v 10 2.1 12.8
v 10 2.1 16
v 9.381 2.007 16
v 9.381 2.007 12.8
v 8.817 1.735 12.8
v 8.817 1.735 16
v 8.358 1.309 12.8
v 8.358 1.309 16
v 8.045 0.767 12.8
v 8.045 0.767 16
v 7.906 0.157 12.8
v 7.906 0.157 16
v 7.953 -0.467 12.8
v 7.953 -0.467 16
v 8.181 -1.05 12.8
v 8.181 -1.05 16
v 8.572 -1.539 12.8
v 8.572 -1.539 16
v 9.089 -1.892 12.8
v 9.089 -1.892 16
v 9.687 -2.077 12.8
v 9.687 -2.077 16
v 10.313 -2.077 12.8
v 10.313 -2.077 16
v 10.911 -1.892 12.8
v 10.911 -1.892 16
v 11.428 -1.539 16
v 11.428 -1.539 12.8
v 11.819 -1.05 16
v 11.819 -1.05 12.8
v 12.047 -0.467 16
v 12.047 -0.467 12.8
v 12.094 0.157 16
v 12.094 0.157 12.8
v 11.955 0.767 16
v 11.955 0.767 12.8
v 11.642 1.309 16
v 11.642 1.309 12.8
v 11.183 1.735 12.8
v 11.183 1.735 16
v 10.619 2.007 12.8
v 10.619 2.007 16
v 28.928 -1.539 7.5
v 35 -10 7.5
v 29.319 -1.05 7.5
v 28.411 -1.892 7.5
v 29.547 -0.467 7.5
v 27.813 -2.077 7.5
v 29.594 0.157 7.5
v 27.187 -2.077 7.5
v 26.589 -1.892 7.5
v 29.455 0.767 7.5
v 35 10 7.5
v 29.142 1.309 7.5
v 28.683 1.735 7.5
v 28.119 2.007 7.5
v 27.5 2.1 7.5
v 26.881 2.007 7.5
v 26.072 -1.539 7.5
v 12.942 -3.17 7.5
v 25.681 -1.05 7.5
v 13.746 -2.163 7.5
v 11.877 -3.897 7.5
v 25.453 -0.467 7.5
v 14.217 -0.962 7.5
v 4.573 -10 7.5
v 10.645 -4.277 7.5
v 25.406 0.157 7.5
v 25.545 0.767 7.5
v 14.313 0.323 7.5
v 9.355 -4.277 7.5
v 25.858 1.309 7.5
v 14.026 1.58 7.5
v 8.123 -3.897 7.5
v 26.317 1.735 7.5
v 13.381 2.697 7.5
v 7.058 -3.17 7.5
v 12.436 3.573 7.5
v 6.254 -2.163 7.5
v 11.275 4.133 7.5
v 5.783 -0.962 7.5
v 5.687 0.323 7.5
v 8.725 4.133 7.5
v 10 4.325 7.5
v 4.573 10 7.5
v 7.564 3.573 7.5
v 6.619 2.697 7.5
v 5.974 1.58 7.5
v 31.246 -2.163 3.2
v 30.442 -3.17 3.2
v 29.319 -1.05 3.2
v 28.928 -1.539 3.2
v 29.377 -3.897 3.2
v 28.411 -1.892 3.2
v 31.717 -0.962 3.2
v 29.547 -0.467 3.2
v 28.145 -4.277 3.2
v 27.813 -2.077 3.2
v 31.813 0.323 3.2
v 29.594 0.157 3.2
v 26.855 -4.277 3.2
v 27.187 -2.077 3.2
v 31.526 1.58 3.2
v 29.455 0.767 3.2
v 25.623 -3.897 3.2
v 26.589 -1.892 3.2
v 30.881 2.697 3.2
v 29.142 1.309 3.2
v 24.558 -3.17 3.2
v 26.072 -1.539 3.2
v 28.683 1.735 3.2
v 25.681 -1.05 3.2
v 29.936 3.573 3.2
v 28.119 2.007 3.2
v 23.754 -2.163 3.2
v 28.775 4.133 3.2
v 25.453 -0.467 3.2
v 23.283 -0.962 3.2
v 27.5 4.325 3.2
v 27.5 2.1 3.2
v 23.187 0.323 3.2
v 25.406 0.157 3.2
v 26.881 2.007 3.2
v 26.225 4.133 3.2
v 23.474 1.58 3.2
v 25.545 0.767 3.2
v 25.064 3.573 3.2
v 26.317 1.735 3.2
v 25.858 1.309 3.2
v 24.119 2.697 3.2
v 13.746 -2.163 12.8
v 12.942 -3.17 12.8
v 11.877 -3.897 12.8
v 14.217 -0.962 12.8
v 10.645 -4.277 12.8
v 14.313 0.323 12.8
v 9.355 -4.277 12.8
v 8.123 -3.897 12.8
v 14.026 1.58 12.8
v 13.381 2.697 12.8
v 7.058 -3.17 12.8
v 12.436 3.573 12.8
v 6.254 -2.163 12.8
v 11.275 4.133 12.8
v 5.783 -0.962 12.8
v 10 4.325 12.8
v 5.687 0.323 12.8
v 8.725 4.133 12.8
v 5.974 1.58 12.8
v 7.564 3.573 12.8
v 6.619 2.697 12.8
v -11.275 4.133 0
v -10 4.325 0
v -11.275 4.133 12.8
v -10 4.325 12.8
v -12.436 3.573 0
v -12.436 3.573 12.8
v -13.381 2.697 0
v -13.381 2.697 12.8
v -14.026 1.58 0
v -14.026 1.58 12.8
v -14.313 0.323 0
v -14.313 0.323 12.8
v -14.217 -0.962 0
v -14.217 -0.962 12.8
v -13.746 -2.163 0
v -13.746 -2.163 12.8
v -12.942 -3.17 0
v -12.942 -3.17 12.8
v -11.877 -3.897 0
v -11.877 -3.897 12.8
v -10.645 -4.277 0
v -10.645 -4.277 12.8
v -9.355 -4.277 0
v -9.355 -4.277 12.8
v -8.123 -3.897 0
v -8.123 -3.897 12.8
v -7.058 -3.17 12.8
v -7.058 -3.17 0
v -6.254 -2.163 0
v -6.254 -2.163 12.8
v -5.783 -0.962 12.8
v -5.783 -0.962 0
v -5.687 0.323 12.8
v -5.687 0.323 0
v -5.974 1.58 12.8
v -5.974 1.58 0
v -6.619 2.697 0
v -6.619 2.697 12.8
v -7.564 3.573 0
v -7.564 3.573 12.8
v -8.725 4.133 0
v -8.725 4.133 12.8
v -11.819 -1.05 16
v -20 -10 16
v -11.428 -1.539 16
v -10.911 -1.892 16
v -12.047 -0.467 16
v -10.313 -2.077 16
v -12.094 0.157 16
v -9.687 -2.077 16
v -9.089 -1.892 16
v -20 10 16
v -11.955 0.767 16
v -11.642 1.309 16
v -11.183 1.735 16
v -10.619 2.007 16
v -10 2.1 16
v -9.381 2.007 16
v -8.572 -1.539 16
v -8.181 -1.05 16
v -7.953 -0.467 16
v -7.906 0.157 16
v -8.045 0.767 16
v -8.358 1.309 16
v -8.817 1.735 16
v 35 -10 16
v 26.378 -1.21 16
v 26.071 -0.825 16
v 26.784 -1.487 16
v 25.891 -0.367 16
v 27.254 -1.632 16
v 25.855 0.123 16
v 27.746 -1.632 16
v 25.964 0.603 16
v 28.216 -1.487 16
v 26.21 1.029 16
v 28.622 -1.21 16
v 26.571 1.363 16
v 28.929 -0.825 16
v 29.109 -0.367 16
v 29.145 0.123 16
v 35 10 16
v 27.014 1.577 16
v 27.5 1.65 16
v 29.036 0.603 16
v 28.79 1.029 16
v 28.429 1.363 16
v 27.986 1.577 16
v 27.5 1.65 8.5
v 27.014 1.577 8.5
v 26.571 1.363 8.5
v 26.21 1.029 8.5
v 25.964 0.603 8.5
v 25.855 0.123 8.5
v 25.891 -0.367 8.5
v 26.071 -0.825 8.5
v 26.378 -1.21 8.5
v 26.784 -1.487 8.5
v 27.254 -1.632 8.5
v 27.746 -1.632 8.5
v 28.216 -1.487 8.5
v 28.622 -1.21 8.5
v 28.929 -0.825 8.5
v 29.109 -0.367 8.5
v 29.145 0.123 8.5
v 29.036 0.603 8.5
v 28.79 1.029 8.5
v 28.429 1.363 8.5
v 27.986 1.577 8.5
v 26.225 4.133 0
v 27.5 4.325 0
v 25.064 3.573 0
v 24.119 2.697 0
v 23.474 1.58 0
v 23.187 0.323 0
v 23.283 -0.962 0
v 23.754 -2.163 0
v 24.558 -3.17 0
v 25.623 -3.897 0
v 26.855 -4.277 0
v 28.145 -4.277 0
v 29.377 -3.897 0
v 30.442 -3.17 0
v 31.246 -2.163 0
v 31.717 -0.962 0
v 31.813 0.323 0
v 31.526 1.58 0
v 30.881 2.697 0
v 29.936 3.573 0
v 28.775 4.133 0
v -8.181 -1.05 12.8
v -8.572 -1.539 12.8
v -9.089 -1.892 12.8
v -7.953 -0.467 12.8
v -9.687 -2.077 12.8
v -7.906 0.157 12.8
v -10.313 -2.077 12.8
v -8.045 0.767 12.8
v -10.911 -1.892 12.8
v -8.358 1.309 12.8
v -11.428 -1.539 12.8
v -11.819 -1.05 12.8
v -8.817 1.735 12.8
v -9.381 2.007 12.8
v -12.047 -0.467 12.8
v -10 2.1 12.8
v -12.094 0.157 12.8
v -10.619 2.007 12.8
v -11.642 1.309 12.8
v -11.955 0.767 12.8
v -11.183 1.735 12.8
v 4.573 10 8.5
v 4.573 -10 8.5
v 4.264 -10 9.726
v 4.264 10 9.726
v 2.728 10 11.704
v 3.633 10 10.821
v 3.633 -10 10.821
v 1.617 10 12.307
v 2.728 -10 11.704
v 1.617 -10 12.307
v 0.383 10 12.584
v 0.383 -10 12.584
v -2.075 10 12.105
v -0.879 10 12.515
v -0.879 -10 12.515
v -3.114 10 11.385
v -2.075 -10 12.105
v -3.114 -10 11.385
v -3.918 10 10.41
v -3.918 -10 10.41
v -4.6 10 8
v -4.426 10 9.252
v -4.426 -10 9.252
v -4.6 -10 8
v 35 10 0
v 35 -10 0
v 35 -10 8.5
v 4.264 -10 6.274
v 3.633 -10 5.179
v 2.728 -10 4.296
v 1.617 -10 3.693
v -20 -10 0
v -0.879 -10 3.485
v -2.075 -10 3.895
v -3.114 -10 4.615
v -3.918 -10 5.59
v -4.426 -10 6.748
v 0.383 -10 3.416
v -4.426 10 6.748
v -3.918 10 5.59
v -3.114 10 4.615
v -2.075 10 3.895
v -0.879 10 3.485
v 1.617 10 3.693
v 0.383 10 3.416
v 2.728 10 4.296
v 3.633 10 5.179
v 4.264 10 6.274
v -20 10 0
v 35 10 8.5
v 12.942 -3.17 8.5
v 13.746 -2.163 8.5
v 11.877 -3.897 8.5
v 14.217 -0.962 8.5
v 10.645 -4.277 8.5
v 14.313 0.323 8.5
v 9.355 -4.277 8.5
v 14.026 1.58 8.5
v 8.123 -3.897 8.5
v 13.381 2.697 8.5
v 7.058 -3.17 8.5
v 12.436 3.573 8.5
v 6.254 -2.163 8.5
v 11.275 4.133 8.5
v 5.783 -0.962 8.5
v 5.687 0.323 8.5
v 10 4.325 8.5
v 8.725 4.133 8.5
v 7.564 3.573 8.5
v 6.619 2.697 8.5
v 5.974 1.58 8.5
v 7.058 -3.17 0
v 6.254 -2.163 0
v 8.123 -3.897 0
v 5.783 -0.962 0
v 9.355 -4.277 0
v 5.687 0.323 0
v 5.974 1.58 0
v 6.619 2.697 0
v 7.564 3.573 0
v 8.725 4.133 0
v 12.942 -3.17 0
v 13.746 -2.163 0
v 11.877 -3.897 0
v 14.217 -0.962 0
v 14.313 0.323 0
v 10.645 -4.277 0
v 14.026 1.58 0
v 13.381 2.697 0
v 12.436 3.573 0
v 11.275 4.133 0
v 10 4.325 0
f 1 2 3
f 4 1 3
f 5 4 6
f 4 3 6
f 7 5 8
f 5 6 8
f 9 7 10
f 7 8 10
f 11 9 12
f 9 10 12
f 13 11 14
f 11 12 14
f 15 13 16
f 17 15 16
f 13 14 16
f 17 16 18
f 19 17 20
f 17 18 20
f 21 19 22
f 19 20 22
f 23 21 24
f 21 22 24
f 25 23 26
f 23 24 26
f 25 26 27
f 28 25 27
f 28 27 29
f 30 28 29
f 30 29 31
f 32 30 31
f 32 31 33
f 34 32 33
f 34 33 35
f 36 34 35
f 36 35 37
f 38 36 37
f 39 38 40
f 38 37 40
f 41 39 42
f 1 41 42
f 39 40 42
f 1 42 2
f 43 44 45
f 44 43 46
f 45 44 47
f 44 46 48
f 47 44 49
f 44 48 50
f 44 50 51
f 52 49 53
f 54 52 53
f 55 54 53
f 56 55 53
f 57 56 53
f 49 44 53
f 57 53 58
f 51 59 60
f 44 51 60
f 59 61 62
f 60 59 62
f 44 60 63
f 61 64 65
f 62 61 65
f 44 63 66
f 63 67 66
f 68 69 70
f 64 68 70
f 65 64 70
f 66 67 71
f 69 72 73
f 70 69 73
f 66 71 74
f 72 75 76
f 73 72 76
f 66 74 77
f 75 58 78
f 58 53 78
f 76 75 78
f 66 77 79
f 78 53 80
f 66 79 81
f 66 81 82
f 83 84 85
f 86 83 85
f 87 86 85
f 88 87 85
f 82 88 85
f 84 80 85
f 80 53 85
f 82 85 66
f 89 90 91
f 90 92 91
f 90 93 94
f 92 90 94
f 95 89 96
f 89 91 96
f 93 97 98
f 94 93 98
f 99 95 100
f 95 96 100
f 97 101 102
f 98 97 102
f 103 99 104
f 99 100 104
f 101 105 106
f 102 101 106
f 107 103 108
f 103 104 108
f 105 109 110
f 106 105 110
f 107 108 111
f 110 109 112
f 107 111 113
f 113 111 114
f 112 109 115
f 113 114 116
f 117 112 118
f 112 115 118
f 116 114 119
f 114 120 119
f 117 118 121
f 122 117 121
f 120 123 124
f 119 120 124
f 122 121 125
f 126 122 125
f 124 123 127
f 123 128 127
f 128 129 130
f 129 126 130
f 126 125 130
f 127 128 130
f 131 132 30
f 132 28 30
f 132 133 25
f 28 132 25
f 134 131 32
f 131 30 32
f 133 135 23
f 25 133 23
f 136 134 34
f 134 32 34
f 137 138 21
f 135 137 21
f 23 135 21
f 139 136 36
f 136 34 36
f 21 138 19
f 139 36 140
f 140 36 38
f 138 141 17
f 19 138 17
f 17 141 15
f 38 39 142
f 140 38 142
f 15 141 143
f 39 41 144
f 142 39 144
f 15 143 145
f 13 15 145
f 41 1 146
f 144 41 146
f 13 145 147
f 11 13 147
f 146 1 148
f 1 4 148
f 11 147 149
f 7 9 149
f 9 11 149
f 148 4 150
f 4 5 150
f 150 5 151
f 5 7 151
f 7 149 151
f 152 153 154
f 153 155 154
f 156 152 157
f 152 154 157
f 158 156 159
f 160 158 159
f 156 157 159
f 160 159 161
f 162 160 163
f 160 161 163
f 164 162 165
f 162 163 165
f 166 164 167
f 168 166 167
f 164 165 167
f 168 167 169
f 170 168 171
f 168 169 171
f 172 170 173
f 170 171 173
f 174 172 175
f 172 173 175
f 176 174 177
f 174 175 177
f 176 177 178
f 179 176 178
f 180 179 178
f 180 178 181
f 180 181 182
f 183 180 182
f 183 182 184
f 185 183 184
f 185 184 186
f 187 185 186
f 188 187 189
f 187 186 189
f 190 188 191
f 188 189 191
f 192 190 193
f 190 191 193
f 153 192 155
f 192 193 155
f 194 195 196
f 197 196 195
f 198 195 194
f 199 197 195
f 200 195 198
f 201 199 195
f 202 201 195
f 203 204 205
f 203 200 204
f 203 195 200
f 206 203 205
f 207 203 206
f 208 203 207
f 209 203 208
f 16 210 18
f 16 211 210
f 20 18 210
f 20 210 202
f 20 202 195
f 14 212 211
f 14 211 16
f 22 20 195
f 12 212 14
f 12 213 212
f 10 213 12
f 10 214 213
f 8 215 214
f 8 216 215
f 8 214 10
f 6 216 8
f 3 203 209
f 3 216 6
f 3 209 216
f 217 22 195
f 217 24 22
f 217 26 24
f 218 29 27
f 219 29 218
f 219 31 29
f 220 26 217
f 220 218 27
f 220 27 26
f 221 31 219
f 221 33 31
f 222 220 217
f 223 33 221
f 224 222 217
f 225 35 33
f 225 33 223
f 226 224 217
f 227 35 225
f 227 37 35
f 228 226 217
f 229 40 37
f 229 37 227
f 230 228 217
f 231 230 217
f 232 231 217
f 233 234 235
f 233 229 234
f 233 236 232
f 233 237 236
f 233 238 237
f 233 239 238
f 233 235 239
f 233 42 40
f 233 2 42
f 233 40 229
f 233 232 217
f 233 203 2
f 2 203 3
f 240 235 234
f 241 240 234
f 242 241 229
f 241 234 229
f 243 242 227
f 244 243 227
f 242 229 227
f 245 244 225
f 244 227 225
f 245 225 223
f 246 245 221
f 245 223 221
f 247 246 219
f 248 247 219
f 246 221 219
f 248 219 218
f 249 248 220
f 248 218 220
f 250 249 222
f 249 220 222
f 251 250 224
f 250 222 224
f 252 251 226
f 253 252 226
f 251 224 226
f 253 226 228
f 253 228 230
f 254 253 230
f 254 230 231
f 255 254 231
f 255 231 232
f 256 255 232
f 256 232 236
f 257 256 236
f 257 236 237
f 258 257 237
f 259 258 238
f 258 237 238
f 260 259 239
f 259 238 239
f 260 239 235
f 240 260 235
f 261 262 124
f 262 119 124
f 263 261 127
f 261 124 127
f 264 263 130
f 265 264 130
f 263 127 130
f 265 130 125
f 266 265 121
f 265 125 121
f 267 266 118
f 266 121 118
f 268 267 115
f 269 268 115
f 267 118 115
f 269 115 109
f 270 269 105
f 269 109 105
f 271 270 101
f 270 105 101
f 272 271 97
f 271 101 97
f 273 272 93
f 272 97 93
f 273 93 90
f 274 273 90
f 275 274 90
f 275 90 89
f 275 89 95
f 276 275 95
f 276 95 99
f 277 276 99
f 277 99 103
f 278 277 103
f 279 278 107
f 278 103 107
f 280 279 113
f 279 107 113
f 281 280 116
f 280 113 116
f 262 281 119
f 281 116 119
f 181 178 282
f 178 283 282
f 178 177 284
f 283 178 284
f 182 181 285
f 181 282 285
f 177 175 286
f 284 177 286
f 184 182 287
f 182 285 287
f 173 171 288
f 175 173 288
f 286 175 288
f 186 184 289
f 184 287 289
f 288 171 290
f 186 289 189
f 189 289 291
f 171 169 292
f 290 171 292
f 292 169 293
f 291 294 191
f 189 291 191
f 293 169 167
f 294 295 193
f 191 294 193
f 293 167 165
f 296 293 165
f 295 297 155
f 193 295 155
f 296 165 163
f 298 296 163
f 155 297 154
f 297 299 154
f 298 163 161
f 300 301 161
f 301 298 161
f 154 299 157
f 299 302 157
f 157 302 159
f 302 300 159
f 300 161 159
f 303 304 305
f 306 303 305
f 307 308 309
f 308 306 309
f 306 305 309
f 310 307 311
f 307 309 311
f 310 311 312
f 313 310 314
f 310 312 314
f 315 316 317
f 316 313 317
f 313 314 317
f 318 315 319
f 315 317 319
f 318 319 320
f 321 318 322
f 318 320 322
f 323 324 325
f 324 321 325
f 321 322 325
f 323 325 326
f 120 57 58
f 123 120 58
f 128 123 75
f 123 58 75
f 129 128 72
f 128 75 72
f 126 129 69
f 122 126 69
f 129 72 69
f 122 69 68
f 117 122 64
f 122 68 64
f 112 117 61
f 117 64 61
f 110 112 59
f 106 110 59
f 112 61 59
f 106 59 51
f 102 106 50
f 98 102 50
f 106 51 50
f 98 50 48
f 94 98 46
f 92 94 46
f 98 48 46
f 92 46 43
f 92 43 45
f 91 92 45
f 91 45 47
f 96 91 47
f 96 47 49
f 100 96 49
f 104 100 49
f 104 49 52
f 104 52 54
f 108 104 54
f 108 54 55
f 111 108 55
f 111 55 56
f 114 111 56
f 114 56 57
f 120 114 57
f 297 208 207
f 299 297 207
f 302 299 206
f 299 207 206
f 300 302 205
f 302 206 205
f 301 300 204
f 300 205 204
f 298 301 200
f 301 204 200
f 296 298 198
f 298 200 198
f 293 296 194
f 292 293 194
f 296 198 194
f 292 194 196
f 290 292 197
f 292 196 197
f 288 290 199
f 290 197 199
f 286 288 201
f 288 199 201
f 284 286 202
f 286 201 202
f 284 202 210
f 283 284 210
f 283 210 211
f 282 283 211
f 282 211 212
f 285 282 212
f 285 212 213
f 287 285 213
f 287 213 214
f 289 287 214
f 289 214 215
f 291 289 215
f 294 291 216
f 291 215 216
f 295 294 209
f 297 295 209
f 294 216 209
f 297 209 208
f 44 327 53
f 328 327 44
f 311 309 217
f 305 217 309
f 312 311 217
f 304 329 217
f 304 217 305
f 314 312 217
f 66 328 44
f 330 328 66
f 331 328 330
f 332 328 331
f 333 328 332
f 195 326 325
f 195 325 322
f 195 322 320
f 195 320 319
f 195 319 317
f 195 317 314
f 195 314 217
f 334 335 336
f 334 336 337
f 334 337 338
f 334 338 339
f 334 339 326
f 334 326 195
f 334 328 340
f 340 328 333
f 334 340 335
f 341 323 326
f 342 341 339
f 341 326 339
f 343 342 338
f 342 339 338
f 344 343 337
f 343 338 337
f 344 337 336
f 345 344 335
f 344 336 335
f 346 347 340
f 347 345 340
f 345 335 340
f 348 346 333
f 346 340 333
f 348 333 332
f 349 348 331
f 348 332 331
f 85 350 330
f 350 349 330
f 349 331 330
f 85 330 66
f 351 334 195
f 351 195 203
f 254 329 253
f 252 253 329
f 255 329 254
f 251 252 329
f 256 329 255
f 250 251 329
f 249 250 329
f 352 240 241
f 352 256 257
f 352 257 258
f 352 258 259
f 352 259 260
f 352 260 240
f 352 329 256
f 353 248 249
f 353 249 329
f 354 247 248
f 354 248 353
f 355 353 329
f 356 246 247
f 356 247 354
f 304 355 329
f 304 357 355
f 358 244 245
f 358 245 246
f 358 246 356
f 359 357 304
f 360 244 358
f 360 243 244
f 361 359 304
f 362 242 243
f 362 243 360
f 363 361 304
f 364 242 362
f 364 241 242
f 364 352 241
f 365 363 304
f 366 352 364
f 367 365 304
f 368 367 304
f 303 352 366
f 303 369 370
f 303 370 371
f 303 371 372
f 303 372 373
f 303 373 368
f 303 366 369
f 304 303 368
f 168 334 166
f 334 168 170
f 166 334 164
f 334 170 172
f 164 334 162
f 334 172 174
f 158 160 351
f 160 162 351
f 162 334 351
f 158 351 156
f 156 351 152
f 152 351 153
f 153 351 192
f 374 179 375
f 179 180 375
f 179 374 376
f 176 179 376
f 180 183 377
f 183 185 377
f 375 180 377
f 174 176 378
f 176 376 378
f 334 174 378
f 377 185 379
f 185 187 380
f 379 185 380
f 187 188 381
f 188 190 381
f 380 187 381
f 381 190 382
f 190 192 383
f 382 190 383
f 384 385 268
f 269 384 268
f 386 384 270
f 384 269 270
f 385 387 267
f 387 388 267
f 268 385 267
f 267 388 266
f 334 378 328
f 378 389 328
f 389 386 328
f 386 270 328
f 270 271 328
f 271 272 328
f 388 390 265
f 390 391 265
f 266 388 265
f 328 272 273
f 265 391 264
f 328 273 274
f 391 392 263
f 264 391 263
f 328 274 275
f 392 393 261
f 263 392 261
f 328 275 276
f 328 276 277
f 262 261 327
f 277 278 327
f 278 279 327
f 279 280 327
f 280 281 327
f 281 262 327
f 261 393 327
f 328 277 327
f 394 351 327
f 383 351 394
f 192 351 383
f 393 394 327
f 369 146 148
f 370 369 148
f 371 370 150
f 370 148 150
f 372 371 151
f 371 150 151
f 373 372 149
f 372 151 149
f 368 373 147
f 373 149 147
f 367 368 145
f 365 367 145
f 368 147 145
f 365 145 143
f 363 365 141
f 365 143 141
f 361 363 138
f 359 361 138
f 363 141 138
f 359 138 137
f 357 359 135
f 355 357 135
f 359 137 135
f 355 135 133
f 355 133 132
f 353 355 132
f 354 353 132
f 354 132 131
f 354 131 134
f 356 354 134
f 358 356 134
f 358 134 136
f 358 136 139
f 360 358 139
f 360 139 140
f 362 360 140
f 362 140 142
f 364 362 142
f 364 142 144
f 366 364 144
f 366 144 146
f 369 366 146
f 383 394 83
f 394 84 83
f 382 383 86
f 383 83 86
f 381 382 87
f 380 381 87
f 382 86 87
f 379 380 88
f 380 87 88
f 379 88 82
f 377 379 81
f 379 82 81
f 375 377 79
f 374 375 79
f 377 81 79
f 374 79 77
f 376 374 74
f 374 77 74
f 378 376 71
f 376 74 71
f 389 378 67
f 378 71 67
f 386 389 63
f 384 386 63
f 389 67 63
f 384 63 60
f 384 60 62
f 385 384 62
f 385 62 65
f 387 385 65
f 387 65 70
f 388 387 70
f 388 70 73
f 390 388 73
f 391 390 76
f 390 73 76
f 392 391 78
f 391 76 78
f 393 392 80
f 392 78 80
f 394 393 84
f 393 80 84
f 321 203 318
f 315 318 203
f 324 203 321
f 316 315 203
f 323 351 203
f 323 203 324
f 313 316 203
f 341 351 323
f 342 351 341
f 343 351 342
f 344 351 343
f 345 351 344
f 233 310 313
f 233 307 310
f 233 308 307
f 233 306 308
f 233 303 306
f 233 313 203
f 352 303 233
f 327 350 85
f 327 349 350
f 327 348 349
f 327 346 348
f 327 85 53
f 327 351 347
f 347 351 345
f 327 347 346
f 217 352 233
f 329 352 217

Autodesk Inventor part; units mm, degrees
ref_plane "YZ Plane" through (0, 0, 0) normal (1, 0, 0) x (0, 1, 0)
ref_plane "XZ Plane" through (0, 0, 0) normal (0, 1, 0) x (-1, 0, 0)
sketch "Sketch1" plane through (0, 0, 0) normal (0, 0, 1) x (1, 0, 0)
  line L0 (-20, 10) -> (35, 10)
  line L1 (35, 10) -> (35, -10)
  line L2 (35, -10) -> (-20, -10)
  line L3 (-20, -10) -> (-20, 10)
  line L4 (-31, 0) -> (46, 0) projected
  line L5 (0, -14) -> (0, 14) projected
  point P0 (0, 0)
  point P1 (-10, 0)
  point P2 (10, 0)
  point P3 (27.5, 0)
  dimension "d0" = 20
  dimension "d2" = 55
  dimension "d8" = 20
  dimension "d9" = 20
  dimension "d10" = 7.5
extrude "Extrusion1" add sketch "Sketch1" along normal blind 16
sketch "Sketch2" plane through (0, 0, 0) normal (0, 0, 1) x (1, 0, 0)
  line L0 (-20, 10) -> (35, 10)
  line L1 (35, 10) -> (35, -10)
  line L2 (35, -10) -> (-20, -10)
  line L3 (-20, -10) -> (-20, 10)
  line L4 (0, 14) -> (0, -14) projected
  line L5 (-31, 0) -> (46, 0) projected
  point P0 (0, 0)
  point P1 (-10, 0)
  point P2 (10, 0)
  dimension "d38" = 20
  dimension "d39" = 55
  dimension "d41" = 20
hole "Hole4" at (-10, 0, 0) at (10, 0, 0) direction (0, 0, 1) diameter 4.2 end through all counterbore diameter 8.65 counterbore depth 12.8
sketch "Sketch3" plane through (0, 0, 0) normal (0, 0, 1) x (1, 0, 0)
  line L0 (-20, 10) -> (35, 10)
  line L1 (35, 10) -> (35, -10)
  line L2 (35, -10) -> (-20, -10)
  line L3 (-20, -10) -> (-20, 10)
  point P0 (0, 0)
  point P1 (-10, 0)
  point P2 (10, 0)
  point P3 (27.5, 0)
  dimension "d50" = 20
  dimension "d51" = 55
  dimension "d52" = 20
  dimension "d53" = 7.5
hole "Hole5" at (27.5, 0, 0) direction (0, 0, 1) diameter 4.2 depth 8 tip angle 118 counterbore diameter 8.65 counterbore depth 3.2
ref_plane "Work Plane1" through (0, 0, 8) normal (0, 0, -1) x (-1, 0, 0)
sketch "Sketch5" plane through (0, 0, 8) normal (0, 0, -1) x (-1, 0, 0)
  line L0 (-40, -10) -> (0, -10)
  line L1 (0, -10) -> (0, 10)
  line L2 (0, 10) -> (-40, 10)
  line L3 (-40, 10) -> (-40, -10)
  line L4 (49, 0) -> (-49, 0) projected
  line L5 (0, -14) -> (0, 14) projected
  point P0 (0, 0)
  point P1 (0, 0)
  dimension "d64" = 20
  dimension "d65" = 40
extrude "Extrusion2" cut sketch "Sketch5" along normal mid plane 1
sketch "Sketch6" plane through (0, 0, 0) normal (0, 1, 0) x (-1, 0, 0)
  line L0 (0, 7.5) -> (0, 8.5) projected
  circle A0 centre (0, 8) radius 4.6
  point P0 (0, 0)
  dimension "d68" = 9.2
extrude "Extrusion3" cut sketch "Sketch6" along normal mid plane 20
hole "Hole6" at (27.5, 0, 0) direction (0, 0, 1) diameter 3.3 end through all
properties part number "Lezerlefogov3"
